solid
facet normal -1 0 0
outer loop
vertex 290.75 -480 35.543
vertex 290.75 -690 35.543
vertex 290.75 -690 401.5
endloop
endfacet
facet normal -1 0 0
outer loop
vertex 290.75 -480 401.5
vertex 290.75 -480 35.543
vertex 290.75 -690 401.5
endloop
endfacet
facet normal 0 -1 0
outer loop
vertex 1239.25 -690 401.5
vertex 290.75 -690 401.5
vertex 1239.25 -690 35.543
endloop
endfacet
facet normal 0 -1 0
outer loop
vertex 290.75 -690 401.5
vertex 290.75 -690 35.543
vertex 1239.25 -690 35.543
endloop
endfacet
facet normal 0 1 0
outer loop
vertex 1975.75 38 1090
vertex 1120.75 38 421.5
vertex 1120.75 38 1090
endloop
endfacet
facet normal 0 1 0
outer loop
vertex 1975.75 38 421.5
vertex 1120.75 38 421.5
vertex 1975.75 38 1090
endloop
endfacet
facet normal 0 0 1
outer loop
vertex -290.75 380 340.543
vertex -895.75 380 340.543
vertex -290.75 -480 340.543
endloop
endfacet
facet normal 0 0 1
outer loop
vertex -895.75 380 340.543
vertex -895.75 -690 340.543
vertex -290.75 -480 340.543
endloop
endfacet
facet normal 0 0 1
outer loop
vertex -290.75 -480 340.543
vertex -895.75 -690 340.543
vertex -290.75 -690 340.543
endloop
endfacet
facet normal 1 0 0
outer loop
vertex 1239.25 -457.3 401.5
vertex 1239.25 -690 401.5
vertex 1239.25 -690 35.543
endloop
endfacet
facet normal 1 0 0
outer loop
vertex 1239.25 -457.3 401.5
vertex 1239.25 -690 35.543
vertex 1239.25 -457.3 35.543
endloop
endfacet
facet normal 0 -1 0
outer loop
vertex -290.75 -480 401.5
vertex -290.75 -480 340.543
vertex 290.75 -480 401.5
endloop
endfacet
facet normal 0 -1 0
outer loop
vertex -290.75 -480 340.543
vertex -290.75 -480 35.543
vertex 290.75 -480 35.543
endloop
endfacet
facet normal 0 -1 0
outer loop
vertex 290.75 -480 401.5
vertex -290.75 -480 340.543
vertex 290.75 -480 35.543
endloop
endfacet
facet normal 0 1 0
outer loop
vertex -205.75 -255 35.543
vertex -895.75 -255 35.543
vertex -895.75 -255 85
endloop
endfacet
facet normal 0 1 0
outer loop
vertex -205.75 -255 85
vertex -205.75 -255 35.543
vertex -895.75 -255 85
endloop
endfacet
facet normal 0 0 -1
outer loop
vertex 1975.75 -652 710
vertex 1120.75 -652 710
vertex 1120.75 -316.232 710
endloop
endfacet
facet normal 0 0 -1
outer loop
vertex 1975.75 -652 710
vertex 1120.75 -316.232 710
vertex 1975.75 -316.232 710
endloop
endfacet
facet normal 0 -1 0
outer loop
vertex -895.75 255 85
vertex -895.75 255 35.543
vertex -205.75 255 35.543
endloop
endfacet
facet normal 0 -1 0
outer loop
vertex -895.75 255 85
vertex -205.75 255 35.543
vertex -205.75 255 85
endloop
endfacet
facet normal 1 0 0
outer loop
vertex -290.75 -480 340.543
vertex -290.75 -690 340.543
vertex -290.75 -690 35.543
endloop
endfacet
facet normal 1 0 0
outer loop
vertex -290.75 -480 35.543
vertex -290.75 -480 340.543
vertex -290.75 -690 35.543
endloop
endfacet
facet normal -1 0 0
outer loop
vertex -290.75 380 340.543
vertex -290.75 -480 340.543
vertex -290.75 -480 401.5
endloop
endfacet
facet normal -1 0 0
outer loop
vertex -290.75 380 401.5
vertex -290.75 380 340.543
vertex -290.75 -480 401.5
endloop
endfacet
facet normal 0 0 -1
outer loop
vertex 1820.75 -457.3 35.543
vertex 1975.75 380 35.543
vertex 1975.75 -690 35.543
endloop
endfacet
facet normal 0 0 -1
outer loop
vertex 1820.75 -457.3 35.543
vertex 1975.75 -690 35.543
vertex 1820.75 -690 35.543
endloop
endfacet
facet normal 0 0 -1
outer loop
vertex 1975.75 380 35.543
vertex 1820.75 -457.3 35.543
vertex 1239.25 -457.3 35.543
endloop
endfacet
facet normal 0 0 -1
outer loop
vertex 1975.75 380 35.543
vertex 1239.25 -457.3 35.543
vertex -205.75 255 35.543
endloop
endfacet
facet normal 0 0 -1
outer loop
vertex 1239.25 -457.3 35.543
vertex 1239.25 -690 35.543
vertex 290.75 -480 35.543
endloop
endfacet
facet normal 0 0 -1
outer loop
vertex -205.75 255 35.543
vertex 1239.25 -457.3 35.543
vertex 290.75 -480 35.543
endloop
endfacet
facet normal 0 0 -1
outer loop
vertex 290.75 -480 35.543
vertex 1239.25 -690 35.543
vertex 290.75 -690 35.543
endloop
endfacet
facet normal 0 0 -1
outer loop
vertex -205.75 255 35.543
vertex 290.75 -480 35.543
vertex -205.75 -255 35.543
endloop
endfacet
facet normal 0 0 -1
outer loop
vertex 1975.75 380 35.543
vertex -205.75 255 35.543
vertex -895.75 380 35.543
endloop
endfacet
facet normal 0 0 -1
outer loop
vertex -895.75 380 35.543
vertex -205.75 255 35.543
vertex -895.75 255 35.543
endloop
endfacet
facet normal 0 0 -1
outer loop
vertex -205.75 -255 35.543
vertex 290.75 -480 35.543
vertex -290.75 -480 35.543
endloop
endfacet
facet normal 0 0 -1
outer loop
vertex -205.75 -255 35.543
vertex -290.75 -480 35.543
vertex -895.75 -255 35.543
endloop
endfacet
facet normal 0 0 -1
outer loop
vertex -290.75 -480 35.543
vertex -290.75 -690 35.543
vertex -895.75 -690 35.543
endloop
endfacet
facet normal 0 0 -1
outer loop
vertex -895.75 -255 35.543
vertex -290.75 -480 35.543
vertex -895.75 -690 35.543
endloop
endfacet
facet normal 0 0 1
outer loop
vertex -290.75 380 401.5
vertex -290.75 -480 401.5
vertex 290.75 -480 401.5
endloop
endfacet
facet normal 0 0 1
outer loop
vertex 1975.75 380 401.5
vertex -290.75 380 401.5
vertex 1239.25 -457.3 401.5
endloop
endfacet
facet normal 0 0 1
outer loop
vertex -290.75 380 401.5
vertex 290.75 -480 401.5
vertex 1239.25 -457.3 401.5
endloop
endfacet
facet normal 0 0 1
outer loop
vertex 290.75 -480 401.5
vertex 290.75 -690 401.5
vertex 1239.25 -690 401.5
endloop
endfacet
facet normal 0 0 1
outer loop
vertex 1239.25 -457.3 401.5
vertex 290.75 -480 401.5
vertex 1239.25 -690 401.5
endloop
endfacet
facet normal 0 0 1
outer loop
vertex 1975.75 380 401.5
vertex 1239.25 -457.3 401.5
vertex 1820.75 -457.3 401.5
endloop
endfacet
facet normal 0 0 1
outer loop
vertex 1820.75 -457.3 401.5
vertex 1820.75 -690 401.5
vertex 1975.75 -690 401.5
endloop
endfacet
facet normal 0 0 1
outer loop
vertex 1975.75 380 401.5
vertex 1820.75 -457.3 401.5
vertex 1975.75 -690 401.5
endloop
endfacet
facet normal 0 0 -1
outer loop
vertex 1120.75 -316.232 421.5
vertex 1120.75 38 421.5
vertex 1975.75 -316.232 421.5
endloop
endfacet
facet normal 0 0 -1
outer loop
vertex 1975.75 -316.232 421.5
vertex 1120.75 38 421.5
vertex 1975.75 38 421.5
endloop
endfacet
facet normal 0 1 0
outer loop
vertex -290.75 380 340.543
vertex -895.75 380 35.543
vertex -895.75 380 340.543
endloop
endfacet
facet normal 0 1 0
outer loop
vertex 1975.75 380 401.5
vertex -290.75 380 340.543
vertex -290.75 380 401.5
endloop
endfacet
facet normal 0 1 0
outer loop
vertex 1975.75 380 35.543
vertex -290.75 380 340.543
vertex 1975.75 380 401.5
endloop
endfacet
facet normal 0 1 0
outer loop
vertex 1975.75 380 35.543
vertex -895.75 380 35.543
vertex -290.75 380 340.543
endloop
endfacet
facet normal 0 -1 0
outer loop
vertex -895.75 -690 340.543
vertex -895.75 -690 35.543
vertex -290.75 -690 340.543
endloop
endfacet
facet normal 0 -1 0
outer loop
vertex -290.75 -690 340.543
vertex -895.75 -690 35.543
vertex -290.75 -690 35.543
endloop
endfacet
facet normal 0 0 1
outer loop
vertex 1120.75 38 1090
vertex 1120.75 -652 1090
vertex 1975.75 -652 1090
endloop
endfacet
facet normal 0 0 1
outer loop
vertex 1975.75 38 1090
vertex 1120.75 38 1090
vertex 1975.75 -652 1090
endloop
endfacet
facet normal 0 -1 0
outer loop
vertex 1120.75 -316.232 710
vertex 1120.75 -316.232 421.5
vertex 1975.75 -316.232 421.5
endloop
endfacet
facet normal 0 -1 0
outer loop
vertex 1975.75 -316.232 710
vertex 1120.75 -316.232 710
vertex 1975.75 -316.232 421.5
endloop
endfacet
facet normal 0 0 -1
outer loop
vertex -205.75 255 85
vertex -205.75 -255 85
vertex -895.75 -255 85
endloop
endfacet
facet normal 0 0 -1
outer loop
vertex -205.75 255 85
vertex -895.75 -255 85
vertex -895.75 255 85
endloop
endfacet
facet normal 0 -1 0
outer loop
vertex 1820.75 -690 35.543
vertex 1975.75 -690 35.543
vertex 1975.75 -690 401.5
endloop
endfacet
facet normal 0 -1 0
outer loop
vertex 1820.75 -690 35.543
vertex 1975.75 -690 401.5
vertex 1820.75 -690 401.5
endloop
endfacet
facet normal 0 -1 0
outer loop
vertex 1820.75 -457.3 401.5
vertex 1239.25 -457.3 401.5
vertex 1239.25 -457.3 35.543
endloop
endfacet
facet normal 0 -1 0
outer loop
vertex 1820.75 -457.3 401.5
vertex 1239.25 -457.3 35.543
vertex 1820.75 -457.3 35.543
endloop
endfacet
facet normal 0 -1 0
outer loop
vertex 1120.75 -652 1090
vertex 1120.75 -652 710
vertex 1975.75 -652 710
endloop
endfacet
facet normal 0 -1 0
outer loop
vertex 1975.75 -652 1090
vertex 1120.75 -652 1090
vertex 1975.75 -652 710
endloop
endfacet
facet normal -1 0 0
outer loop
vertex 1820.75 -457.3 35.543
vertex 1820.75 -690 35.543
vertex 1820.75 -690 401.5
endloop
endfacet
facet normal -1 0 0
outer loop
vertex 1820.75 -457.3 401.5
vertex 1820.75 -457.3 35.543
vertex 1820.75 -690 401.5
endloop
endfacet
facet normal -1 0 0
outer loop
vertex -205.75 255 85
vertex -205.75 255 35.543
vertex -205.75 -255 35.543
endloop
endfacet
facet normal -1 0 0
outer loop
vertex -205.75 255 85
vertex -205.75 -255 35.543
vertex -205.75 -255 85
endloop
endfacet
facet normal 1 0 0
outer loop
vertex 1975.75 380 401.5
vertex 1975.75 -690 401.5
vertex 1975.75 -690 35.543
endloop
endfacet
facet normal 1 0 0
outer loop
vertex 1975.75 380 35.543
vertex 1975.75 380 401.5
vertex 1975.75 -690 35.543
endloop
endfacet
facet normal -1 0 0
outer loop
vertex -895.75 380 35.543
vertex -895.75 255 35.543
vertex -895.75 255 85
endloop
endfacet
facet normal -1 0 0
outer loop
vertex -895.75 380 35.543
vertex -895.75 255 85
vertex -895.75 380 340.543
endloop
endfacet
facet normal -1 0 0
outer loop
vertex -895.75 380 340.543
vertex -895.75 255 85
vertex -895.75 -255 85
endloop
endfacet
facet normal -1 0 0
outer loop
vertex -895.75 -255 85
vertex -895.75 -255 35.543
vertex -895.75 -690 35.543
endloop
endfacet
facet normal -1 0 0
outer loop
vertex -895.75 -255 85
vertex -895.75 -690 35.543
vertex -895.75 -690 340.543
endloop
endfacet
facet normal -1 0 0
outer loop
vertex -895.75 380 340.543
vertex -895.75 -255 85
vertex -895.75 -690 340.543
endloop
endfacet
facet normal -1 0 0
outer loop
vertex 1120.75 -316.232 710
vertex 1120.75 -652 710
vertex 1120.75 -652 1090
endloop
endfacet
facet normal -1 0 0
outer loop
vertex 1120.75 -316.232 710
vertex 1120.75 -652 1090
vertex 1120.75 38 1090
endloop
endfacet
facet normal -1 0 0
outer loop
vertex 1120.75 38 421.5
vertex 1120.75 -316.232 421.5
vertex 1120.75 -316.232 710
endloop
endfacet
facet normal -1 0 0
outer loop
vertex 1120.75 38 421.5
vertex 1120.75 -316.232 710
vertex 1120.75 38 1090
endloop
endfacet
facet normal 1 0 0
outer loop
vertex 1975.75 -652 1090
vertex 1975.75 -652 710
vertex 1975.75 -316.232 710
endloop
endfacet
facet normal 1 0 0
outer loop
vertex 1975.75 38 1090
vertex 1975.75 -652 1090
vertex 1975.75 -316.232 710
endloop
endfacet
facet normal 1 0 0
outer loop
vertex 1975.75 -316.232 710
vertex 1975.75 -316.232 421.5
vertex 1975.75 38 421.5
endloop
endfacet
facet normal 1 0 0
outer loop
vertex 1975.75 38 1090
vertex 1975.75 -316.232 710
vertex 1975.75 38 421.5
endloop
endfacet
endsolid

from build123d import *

# Parameters (mm, degrees)
DODANIE_WYCI_GNI_CIE9_DEPTH       = 210
DODANIE_WYCI_GNI_CIE9_2_DEPTH     = 210
DODANIE_WYCI_GNI_CIE9_3_DEPTH     = 210
DODANIE_WYCI_GNI_CIE10_DEPTH      = 860
DODANIE_WYCI_GNI_CIE11_DEPTH      = 490
DODANIE_WYCI_GNI_CIE11_DEPTH_BACK = 200
SZKIC7_W                          = 855
SZKIC7_H                          = 380
SZKIC8_W                          = 581.5
SZKIC8_H                          = 22.7
WYTNIJ_WYCI_GNI_CIE1_DEPTH        = 470
SZKIC9_W                          = 85
SZKIC9_H                          = 510
WYTNIJ_WYCI_GNI_CIE2_DEPTH        = 690
SZKIC11_W                         = 855
SZKIC11_H                         = 354.231627321
DODANIE_WYCI_GNI_CIE12_DEPTH      = 290


with BuildPart() as part:
    # Szkic4 → Dodanie-wyciągnięcie9 (new body)
    with BuildSketch(Plane(origin=(0, -690, 0), x_dir=(1, 0, 0), z_dir=(0, 1, 0))):
        Polygon((-290.75, -205.75), (-290.75, -35.542702064), (-895.75, -35.542702064), (-895.75, -340.542702064), (-290.75, -340.542702064), align=None)
    extrude(amount=DODANIE_WYCI_GNI_CIE9_DEPTH)



with BuildPart() as body_2:
    # Szkic4 → Dodanie-wyci_gni_cie9 2 (new body)
    with BuildSketch(Plane(origin=(0, -690, 0), x_dir=(1, 0, 0), z_dir=(0, 1, 0))):
        Polygon((290.75, -401.5), (1239.25, -401.5), (1239.25, -205.75), (1239.25, -35.542702064), (290.75, -35.542702064), (290.75, -205.75), align=None)
    extrude(amount=DODANIE_WYCI_GNI_CIE9_2_DEPTH)


with BuildPart() as body_3:
    # Szkic4 → Dodanie-wyci_gni_cie9 3 (new body)
    with BuildSketch(Plane(origin=(0, -690, 0), x_dir=(1, 0, 0), z_dir=(0, 1, 0))):
        Polygon((1820.75, -205.75), (1820.75, -35.542702064), (1975.75, -35.542702064), (1975.75, -401.5), (1820.75, -401.5), align=None)
    extrude(amount=DODANIE_WYCI_GNI_CIE9_3_DEPTH)


with BuildPart() as part_1:
    add(part.part)

    add(body_2.part)  # Dodanie-wyciągnięcie10 merges body 2

    add(body_3.part)  # Dodanie-wyciągnięcie10 merges body 3
    # Szkic6 → Dodanie-wyciągnięcie10 (add)
    with BuildSketch(Plane(origin=(0, -480, 0), x_dir=(1, 0, 0), z_dir=(0, 1, 0))):
        Polygon((1975.75, -35.542702064), (-895.75, -35.542702064), (-895.75, -340.542702064), (-290.75, -340.542702064), (-290.75, -401.5), (1975.75, -401.5), align=None)
    extrude(amount=DODANIE_WYCI_GNI_CIE10_DEPTH)

    # Szkic8 → Wytnij-wyciągnięcie1 (cut)
    with BuildSketch(Plane.XY.offset(401.5)):
        with Locations((1530, -468.65)):
            Rectangle(SZKIC8_W, SZKIC8_H)
    extrude(amount=-WYTNIJ_WYCI_GNI_CIE1_DEPTH, mode=Mode.SUBTRACT)

    # Szkic9 → Wytnij-wyciągnięcie2 (cut)
    with BuildSketch(Plane.ZY.offset(895.75)):
        with Locations((42.5, 0)):
            Rectangle(SZKIC9_W, SZKIC9_H)
    extrude(amount=-WYTNIJ_WYCI_GNI_CIE2_DEPTH, mode=Mode.SUBTRACT)


with BuildPart() as body_2_2:
    # Szkic7 → Dodanie-wyciągnięcie11 (new, two sides: drawn at the far end of the back side and taken through both)
    with BuildSketch(Plane(origin=(0, -452, 0), x_dir=(1, 0, 0), z_dir=(0, 1, 0)).offset(-DODANIE_WYCI_GNI_CIE11_DEPTH_BACK)):
        with Locations((1548.25, -900)):
            Rectangle(SZKIC7_W, SZKIC7_H)
    extrude(amount=DODANIE_WYCI_GNI_CIE11_DEPTH + DODANIE_WYCI_GNI_CIE11_DEPTH_BACK)

    # Szkic11 → Dodanie-wyciągnięcie12 (add)
    with BuildSketch(Plane.XY.offset(421.5)):
        with Locations((1548.25, -139.115813661)):
            Rectangle(SZKIC11_W, SZKIC11_H)
    extrude(amount=DODANIE_WYCI_GNI_CIE12_DEPTH)


solid = Compound([part_1.part, body_2_2.part])
